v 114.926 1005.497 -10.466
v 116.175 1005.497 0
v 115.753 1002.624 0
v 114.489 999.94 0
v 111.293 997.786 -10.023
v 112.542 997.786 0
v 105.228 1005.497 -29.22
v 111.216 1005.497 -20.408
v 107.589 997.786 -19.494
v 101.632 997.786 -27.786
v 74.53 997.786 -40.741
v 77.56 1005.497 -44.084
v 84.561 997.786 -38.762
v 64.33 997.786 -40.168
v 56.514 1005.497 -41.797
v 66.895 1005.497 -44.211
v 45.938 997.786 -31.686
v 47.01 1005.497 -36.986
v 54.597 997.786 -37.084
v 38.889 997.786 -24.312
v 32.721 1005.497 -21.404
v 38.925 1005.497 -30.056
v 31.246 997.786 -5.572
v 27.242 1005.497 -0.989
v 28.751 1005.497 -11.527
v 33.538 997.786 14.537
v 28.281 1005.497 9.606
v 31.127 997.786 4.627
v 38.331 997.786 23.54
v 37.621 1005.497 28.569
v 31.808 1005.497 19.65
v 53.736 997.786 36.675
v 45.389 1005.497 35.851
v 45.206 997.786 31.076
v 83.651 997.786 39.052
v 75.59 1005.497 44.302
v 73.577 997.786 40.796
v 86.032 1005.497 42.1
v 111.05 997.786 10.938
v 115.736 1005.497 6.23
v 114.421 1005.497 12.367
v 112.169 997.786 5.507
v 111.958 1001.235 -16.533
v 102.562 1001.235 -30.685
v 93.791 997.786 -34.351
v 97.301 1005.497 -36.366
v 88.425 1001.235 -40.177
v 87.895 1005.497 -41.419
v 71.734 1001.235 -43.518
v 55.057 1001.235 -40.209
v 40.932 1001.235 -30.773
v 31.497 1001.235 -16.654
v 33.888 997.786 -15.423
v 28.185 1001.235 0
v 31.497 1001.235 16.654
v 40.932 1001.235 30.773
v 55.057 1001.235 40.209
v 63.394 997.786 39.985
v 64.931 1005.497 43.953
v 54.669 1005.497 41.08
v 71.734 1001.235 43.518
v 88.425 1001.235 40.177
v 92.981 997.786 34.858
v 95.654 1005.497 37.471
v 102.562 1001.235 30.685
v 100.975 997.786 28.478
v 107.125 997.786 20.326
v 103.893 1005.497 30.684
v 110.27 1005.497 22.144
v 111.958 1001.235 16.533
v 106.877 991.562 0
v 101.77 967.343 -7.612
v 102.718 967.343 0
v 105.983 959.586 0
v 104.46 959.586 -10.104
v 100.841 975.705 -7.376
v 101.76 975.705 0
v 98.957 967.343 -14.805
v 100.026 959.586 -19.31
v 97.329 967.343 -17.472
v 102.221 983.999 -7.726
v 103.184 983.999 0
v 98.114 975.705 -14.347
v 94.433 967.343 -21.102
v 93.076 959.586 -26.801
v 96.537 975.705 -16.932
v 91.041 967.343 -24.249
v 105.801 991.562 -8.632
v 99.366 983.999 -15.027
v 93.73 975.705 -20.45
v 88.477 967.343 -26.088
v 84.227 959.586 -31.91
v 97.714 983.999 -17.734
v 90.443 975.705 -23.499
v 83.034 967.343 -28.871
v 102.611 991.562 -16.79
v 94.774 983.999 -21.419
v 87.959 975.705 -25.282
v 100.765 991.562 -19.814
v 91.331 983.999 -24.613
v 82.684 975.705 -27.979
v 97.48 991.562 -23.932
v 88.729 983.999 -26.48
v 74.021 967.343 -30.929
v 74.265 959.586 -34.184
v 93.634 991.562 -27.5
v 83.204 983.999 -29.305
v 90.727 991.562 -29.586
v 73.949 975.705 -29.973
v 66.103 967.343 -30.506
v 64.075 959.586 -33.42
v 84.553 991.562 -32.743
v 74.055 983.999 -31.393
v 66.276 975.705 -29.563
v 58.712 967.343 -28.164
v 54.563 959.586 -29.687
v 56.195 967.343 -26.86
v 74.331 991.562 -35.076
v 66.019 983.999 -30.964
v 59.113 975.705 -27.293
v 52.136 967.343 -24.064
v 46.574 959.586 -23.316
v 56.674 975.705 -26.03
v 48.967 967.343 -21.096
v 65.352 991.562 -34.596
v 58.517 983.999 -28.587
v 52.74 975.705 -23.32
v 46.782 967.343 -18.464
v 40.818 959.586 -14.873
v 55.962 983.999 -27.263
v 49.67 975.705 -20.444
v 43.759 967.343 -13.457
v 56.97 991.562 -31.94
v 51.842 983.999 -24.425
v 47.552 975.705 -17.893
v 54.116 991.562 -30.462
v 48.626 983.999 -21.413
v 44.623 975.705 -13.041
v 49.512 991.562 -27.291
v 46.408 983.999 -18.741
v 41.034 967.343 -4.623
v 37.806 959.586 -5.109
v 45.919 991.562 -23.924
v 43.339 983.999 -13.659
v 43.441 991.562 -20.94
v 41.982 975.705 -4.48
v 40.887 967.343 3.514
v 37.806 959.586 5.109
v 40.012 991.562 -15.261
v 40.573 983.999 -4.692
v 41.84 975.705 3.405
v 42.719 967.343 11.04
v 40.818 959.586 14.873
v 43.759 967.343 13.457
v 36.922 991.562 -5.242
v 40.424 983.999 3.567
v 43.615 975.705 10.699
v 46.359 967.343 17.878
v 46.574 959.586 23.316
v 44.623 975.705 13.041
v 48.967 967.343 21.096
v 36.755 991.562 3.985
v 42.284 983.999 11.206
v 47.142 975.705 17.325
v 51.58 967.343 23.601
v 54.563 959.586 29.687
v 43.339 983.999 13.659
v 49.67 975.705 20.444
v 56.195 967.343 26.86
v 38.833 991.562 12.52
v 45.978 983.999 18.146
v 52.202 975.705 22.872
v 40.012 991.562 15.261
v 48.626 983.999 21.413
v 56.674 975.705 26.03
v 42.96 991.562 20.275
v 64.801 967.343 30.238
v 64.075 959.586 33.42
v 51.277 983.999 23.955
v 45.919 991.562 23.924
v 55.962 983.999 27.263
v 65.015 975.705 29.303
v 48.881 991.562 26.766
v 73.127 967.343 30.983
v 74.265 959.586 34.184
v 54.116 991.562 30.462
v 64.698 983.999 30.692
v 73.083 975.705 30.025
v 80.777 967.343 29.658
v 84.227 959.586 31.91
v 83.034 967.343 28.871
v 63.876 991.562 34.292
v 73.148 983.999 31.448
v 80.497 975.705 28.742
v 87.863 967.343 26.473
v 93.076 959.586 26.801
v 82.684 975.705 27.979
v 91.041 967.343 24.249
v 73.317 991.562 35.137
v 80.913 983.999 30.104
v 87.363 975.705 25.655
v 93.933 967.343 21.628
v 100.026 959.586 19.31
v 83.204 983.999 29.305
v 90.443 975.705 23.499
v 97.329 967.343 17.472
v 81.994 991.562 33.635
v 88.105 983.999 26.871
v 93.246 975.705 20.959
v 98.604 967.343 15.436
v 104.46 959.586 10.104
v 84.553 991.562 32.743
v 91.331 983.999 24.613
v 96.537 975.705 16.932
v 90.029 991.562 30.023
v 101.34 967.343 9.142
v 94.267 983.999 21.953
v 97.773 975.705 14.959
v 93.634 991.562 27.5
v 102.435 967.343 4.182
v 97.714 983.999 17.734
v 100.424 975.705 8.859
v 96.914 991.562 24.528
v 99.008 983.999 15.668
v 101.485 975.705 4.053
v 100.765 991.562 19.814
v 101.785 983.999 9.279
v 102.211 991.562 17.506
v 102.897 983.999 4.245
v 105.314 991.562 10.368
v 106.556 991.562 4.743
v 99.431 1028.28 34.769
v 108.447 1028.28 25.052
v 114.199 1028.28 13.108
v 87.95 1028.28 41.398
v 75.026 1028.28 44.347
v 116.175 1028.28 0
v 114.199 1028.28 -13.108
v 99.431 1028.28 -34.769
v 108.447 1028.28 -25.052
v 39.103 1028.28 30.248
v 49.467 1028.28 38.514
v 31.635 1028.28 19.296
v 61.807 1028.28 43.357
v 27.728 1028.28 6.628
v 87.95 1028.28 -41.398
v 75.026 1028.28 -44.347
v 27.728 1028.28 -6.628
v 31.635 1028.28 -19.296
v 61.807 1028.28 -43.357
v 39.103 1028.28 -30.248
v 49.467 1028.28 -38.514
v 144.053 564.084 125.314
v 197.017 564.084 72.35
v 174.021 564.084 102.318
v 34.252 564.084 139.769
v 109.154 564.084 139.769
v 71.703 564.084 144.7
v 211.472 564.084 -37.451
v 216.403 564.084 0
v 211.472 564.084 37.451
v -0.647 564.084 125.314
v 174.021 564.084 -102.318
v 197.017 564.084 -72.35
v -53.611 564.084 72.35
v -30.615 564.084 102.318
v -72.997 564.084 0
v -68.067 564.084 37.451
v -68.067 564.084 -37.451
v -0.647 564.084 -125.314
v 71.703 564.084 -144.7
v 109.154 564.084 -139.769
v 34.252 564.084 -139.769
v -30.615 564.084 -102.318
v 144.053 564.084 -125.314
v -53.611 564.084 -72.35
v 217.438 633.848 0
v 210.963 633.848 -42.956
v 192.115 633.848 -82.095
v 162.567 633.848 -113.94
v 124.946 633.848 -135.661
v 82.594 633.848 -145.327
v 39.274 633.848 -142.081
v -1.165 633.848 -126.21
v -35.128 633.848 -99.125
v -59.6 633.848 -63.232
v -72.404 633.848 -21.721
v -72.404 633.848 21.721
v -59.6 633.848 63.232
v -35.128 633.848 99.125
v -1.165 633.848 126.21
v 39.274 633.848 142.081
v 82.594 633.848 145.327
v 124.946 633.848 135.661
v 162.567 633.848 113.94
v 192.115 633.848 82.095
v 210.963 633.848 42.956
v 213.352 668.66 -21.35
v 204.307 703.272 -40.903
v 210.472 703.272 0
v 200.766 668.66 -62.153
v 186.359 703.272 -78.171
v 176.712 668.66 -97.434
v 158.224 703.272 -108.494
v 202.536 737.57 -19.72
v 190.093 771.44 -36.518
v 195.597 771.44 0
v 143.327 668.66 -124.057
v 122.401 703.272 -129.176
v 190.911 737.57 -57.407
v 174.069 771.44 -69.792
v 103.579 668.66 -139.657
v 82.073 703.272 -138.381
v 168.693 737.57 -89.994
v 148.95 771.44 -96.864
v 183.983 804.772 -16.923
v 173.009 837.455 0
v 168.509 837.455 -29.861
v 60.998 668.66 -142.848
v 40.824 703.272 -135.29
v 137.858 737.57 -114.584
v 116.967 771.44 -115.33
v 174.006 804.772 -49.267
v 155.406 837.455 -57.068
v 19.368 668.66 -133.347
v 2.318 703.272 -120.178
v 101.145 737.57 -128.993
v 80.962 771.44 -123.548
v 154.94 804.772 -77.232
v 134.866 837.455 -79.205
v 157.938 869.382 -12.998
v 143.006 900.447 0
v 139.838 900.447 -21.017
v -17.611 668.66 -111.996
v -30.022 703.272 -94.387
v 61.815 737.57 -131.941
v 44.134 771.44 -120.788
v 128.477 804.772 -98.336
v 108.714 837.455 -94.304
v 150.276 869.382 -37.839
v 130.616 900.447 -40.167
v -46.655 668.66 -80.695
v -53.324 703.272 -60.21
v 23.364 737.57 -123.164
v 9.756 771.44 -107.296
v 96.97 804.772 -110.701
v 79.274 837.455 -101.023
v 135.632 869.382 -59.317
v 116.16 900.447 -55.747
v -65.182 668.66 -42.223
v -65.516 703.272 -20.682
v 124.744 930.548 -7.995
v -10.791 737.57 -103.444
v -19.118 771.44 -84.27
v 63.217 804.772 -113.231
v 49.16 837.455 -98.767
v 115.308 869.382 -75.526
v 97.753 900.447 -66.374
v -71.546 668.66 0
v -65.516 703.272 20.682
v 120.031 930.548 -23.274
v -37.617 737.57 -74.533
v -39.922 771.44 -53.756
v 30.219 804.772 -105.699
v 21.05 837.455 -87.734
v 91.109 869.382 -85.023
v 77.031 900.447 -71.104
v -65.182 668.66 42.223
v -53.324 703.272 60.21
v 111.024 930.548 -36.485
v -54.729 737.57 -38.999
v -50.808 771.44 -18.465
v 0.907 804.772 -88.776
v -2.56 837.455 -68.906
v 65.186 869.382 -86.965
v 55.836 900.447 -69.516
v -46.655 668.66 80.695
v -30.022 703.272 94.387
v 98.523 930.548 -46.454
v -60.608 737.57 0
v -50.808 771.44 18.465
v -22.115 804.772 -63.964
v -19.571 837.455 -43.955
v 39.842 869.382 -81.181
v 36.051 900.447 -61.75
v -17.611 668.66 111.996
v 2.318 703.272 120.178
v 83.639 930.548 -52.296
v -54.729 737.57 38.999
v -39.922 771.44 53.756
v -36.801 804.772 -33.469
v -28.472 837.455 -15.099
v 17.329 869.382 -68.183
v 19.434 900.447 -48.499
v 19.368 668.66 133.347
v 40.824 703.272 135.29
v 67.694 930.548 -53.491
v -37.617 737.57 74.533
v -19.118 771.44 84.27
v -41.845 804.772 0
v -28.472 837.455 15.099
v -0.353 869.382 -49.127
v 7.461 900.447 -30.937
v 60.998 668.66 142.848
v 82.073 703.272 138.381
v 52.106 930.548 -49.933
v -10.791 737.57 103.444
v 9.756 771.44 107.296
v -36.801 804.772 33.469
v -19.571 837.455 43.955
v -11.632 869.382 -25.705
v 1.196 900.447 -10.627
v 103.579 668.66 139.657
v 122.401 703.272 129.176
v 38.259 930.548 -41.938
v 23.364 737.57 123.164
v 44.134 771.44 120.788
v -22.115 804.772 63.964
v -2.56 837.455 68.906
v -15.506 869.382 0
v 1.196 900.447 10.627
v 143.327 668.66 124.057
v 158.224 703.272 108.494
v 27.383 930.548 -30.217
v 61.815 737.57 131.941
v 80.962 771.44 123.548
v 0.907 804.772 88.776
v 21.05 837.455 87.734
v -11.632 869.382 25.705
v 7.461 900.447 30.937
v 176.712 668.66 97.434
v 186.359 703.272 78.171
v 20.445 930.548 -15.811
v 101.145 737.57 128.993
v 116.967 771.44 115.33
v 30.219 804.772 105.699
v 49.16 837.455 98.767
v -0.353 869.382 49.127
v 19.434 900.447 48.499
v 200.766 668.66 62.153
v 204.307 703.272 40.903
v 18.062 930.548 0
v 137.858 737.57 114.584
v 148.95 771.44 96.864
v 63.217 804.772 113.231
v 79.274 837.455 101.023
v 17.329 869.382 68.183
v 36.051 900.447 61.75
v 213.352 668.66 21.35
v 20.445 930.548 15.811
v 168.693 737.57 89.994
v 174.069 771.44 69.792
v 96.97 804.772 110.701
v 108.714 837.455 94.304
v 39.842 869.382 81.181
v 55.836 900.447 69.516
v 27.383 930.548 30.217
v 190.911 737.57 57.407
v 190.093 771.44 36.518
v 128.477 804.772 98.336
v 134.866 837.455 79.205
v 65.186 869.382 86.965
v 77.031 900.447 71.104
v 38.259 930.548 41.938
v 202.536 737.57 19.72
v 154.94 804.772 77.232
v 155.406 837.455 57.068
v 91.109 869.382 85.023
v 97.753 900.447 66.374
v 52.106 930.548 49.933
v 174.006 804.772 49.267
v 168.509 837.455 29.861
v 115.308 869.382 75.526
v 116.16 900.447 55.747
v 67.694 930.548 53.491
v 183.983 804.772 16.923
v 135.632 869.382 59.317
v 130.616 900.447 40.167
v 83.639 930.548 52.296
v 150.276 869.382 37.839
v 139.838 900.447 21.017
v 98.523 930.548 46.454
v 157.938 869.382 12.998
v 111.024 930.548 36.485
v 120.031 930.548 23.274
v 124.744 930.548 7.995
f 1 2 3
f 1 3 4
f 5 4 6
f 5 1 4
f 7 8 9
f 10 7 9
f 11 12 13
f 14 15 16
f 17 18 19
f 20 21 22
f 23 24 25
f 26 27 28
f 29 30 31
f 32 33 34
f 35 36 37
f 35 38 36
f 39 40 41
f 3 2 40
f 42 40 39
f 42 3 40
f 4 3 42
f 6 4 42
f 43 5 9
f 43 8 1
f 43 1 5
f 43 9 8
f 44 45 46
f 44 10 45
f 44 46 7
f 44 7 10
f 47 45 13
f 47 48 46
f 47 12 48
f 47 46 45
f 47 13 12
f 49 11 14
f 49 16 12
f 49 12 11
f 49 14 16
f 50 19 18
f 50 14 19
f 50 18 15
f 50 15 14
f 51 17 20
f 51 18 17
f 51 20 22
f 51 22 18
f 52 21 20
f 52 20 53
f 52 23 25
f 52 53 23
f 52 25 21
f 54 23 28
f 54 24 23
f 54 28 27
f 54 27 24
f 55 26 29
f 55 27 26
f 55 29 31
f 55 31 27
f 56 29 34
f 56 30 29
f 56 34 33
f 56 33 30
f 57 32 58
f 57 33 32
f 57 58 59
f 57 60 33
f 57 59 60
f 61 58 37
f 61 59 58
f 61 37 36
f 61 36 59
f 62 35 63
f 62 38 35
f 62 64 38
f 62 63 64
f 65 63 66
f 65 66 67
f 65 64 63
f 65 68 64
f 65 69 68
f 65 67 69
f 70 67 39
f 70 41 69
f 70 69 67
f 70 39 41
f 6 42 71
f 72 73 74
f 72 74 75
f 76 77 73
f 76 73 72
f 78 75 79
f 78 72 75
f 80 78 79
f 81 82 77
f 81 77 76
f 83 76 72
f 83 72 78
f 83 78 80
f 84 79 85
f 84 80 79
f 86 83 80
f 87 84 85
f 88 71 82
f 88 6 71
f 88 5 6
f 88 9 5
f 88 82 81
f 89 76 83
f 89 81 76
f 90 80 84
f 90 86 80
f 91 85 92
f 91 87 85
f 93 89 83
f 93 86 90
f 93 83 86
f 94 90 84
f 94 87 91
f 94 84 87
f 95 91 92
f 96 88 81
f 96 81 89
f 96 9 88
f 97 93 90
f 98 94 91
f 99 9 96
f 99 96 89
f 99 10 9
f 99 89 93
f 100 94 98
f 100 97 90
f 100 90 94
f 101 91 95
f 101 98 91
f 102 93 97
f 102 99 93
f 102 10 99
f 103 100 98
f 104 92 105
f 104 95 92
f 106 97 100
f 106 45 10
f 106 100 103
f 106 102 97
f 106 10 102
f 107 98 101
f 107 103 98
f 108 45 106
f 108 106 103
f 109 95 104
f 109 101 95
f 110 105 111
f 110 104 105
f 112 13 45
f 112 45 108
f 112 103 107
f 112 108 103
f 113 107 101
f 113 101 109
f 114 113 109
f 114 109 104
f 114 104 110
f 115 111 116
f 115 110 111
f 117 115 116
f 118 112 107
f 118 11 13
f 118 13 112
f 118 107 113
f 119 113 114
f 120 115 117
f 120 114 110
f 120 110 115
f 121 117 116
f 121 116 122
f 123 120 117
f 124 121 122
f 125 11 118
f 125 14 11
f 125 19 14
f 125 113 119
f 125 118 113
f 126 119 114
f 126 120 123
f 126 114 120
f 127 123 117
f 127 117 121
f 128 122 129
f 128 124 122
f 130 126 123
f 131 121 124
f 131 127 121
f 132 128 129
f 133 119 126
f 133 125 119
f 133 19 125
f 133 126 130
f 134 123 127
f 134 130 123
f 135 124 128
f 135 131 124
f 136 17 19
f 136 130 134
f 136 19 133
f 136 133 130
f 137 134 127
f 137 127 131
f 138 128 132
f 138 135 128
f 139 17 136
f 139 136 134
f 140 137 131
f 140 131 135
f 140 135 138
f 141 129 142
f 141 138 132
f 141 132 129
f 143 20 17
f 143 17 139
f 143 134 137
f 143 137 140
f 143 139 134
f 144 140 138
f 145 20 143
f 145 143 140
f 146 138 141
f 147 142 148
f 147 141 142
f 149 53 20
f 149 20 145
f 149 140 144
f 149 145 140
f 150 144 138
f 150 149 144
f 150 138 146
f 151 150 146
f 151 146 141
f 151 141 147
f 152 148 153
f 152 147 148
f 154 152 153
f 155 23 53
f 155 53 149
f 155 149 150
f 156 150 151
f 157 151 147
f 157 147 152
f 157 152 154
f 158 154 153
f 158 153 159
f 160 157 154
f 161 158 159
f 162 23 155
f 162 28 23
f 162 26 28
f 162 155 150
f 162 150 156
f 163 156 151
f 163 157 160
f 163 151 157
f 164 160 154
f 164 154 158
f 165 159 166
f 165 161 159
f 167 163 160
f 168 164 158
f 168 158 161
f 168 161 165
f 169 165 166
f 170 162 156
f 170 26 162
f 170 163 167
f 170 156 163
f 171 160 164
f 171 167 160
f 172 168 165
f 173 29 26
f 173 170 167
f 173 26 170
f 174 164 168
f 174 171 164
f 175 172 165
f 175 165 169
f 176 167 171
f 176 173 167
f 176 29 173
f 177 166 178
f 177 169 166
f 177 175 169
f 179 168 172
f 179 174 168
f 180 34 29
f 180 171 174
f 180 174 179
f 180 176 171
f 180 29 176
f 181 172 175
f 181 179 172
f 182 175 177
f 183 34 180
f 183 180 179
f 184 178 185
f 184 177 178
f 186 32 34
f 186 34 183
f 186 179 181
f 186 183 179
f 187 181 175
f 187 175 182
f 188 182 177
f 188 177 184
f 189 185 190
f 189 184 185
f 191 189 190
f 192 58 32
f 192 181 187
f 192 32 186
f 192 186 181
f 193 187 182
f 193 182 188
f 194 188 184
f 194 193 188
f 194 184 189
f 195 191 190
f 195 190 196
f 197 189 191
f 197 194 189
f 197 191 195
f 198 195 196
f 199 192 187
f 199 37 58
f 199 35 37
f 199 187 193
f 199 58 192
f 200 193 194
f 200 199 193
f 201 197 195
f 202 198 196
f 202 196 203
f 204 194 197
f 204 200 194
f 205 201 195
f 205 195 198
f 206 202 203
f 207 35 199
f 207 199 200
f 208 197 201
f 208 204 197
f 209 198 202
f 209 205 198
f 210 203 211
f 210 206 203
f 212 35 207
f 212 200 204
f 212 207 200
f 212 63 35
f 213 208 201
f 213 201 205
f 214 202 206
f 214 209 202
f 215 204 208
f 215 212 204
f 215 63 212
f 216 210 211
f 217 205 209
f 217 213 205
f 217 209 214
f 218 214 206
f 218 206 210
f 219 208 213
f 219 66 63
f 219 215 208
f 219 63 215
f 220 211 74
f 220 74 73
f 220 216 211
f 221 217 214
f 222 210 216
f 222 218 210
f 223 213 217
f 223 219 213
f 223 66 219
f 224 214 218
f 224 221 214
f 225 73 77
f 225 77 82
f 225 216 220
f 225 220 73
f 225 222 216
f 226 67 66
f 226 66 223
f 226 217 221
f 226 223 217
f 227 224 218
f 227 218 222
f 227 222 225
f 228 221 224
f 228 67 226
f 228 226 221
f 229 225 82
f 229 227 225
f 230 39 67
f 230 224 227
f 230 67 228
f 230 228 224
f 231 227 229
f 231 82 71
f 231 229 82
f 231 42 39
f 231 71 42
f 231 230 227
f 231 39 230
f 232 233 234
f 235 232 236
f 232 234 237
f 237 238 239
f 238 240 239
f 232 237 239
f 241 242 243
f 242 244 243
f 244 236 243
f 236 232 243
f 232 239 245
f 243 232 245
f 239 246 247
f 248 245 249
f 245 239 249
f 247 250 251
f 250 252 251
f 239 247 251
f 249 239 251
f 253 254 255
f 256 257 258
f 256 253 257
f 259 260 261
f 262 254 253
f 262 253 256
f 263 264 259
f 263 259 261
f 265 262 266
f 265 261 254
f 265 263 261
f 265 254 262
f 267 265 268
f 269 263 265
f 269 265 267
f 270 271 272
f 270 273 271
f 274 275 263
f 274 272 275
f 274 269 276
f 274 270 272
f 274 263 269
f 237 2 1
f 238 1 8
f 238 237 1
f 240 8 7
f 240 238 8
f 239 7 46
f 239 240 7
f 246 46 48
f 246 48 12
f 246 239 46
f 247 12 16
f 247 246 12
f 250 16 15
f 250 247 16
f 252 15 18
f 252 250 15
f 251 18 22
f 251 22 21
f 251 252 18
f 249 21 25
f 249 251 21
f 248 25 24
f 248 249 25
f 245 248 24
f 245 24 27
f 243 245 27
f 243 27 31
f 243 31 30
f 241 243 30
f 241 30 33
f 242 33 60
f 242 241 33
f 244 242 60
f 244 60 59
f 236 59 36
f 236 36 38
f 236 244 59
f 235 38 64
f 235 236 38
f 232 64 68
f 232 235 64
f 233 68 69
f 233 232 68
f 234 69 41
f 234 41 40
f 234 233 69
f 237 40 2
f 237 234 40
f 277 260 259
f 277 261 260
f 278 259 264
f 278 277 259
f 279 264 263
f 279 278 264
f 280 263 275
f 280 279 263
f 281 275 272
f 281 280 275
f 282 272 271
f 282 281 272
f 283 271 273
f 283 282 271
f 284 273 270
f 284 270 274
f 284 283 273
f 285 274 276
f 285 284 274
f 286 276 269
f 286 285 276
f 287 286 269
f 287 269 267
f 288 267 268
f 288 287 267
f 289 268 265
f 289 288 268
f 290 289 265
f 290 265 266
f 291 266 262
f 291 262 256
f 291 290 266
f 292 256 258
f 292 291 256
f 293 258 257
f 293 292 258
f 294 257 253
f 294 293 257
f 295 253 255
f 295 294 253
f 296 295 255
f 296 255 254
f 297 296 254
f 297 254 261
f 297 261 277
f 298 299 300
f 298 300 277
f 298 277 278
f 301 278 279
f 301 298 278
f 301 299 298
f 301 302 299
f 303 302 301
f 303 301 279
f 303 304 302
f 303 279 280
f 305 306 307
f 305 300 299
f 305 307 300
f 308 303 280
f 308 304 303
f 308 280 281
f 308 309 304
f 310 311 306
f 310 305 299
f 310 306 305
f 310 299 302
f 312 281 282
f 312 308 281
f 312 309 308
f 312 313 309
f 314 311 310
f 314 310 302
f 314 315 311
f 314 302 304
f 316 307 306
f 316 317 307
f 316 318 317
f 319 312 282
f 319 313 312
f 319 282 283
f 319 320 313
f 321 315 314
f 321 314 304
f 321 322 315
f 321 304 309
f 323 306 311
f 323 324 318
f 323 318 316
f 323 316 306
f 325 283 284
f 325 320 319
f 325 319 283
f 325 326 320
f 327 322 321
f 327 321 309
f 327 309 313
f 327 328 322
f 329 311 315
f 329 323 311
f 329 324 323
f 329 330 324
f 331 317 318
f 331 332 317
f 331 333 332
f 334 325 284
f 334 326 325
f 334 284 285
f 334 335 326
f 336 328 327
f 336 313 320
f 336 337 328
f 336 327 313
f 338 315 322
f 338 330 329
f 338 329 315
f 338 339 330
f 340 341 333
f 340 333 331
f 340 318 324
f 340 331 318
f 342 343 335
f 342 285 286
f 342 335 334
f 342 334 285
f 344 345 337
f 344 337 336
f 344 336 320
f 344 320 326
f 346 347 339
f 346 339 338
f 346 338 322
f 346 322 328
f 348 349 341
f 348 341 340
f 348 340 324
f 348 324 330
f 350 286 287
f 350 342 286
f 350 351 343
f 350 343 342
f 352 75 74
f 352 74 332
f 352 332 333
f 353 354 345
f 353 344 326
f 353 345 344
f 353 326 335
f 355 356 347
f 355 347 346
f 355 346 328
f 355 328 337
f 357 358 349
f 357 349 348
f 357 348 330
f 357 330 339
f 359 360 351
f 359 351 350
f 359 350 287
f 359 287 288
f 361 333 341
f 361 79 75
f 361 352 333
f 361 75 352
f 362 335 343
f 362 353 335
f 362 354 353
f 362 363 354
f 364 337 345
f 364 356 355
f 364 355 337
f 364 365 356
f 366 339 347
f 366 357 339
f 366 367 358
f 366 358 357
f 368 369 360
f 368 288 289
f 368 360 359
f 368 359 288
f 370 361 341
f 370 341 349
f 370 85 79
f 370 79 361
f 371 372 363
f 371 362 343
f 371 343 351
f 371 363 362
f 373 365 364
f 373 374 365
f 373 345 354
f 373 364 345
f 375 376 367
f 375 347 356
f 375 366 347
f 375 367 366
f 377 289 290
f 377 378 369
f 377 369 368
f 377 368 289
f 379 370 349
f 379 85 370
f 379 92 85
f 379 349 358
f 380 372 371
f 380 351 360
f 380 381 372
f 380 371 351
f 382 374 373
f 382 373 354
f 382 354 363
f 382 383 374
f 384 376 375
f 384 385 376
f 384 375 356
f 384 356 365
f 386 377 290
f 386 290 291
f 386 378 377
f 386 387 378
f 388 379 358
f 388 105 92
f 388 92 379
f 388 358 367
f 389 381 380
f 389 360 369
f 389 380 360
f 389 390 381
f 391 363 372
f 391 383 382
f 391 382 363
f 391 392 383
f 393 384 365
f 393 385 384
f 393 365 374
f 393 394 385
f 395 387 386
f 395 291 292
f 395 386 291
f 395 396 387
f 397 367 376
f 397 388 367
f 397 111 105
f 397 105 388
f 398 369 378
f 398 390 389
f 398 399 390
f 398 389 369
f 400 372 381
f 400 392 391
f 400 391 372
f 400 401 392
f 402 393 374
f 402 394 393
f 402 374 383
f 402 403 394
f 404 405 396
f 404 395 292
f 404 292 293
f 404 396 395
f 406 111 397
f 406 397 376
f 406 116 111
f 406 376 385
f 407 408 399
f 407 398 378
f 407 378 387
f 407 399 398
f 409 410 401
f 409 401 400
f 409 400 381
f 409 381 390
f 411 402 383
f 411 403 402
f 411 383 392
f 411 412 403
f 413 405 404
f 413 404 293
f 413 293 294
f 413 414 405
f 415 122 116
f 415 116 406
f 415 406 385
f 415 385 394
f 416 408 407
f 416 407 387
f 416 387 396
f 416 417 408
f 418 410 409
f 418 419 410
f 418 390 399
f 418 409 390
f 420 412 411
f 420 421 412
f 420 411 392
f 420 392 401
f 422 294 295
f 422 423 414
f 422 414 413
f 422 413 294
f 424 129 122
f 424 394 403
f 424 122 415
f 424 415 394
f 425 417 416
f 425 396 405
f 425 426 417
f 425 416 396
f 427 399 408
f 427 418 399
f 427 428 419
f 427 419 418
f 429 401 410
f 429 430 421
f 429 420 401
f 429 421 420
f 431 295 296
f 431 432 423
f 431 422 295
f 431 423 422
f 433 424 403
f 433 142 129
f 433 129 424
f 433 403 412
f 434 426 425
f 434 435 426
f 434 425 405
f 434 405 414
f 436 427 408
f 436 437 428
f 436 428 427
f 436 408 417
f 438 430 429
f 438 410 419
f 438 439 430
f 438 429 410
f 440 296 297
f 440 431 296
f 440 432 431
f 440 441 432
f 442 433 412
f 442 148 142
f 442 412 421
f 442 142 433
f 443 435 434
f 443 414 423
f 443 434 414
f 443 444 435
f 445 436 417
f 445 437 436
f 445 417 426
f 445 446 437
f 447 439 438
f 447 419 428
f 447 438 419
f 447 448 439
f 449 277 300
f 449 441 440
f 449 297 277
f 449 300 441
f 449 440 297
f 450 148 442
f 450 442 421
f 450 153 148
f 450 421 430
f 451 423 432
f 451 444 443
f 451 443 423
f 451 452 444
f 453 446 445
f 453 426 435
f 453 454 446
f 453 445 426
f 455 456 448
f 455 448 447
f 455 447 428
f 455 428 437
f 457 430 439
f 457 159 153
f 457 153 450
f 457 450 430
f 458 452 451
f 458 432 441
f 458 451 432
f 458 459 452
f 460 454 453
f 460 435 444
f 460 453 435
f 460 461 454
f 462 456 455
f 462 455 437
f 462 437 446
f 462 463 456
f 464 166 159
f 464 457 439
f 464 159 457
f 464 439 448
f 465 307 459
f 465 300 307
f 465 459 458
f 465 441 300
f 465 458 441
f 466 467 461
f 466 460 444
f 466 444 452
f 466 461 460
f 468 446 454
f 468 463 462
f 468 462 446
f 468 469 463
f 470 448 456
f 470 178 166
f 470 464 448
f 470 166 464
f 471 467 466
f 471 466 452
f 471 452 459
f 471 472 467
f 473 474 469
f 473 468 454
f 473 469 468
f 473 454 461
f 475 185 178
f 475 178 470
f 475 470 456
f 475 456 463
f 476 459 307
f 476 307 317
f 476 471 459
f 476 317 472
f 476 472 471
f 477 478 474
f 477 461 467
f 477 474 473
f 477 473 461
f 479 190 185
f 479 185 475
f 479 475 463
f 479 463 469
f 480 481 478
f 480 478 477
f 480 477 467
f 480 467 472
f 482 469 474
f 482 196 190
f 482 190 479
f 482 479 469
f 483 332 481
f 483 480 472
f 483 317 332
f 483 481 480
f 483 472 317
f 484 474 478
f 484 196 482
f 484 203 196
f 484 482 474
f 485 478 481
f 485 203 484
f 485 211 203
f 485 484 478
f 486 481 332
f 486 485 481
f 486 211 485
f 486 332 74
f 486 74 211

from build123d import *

# Parameters (mm, degrees)
SKETCH7_4_W = 44.471765842
SKETCH7_4_H = 27.926166375
FILLET1_R   = 10


with BuildPart() as part:
    # Sketch7 → Revolve1 (revolve)
    with BuildSketch(Plane.XY):
        with BuildLine():
            Line((71.702906323, 1000.353807812), (71.702906323, 564.083974187))
            Line((71.702906323, 564.083974187), (216.402906323, 564.083974187))
            ThreePointArc((216.402906323, 564.083974187), (195.597200889, 771.440280452), (105.982681142, 959.585843719))
            ThreePointArc((105.982681142, 959.585843719), (102.635354835, 982.08065622), (116.174672165, 1000.353807812))
            Line((116.174672165, 1000.353807812), (71.702906323, 1000.353807812))
        make_face()
    revolve(axis=Axis((71.702906323, 564.083974187, 0), (0, 1, 0)))

    # Sketch7<4> → Revolve2 (revolve)
    with BuildSketch(Plane.XY):
        with Locations((93.938789244, 1014.316891)):
            Rectangle(SKETCH7_4_W, SKETCH7_4_H)
    revolve(axis=Axis((71.702906323, 564.083974187, 0), (0, 1, 0)))

    # Fillet1
    fillet1_edges = [part.edges().sort_by_distance(p)[0] for p in [
        (27.231140482, 1000.353807812, 0),
    ]]
    fillet(fillet1_edges, radius=FILLET1_R)


solid = part.part
